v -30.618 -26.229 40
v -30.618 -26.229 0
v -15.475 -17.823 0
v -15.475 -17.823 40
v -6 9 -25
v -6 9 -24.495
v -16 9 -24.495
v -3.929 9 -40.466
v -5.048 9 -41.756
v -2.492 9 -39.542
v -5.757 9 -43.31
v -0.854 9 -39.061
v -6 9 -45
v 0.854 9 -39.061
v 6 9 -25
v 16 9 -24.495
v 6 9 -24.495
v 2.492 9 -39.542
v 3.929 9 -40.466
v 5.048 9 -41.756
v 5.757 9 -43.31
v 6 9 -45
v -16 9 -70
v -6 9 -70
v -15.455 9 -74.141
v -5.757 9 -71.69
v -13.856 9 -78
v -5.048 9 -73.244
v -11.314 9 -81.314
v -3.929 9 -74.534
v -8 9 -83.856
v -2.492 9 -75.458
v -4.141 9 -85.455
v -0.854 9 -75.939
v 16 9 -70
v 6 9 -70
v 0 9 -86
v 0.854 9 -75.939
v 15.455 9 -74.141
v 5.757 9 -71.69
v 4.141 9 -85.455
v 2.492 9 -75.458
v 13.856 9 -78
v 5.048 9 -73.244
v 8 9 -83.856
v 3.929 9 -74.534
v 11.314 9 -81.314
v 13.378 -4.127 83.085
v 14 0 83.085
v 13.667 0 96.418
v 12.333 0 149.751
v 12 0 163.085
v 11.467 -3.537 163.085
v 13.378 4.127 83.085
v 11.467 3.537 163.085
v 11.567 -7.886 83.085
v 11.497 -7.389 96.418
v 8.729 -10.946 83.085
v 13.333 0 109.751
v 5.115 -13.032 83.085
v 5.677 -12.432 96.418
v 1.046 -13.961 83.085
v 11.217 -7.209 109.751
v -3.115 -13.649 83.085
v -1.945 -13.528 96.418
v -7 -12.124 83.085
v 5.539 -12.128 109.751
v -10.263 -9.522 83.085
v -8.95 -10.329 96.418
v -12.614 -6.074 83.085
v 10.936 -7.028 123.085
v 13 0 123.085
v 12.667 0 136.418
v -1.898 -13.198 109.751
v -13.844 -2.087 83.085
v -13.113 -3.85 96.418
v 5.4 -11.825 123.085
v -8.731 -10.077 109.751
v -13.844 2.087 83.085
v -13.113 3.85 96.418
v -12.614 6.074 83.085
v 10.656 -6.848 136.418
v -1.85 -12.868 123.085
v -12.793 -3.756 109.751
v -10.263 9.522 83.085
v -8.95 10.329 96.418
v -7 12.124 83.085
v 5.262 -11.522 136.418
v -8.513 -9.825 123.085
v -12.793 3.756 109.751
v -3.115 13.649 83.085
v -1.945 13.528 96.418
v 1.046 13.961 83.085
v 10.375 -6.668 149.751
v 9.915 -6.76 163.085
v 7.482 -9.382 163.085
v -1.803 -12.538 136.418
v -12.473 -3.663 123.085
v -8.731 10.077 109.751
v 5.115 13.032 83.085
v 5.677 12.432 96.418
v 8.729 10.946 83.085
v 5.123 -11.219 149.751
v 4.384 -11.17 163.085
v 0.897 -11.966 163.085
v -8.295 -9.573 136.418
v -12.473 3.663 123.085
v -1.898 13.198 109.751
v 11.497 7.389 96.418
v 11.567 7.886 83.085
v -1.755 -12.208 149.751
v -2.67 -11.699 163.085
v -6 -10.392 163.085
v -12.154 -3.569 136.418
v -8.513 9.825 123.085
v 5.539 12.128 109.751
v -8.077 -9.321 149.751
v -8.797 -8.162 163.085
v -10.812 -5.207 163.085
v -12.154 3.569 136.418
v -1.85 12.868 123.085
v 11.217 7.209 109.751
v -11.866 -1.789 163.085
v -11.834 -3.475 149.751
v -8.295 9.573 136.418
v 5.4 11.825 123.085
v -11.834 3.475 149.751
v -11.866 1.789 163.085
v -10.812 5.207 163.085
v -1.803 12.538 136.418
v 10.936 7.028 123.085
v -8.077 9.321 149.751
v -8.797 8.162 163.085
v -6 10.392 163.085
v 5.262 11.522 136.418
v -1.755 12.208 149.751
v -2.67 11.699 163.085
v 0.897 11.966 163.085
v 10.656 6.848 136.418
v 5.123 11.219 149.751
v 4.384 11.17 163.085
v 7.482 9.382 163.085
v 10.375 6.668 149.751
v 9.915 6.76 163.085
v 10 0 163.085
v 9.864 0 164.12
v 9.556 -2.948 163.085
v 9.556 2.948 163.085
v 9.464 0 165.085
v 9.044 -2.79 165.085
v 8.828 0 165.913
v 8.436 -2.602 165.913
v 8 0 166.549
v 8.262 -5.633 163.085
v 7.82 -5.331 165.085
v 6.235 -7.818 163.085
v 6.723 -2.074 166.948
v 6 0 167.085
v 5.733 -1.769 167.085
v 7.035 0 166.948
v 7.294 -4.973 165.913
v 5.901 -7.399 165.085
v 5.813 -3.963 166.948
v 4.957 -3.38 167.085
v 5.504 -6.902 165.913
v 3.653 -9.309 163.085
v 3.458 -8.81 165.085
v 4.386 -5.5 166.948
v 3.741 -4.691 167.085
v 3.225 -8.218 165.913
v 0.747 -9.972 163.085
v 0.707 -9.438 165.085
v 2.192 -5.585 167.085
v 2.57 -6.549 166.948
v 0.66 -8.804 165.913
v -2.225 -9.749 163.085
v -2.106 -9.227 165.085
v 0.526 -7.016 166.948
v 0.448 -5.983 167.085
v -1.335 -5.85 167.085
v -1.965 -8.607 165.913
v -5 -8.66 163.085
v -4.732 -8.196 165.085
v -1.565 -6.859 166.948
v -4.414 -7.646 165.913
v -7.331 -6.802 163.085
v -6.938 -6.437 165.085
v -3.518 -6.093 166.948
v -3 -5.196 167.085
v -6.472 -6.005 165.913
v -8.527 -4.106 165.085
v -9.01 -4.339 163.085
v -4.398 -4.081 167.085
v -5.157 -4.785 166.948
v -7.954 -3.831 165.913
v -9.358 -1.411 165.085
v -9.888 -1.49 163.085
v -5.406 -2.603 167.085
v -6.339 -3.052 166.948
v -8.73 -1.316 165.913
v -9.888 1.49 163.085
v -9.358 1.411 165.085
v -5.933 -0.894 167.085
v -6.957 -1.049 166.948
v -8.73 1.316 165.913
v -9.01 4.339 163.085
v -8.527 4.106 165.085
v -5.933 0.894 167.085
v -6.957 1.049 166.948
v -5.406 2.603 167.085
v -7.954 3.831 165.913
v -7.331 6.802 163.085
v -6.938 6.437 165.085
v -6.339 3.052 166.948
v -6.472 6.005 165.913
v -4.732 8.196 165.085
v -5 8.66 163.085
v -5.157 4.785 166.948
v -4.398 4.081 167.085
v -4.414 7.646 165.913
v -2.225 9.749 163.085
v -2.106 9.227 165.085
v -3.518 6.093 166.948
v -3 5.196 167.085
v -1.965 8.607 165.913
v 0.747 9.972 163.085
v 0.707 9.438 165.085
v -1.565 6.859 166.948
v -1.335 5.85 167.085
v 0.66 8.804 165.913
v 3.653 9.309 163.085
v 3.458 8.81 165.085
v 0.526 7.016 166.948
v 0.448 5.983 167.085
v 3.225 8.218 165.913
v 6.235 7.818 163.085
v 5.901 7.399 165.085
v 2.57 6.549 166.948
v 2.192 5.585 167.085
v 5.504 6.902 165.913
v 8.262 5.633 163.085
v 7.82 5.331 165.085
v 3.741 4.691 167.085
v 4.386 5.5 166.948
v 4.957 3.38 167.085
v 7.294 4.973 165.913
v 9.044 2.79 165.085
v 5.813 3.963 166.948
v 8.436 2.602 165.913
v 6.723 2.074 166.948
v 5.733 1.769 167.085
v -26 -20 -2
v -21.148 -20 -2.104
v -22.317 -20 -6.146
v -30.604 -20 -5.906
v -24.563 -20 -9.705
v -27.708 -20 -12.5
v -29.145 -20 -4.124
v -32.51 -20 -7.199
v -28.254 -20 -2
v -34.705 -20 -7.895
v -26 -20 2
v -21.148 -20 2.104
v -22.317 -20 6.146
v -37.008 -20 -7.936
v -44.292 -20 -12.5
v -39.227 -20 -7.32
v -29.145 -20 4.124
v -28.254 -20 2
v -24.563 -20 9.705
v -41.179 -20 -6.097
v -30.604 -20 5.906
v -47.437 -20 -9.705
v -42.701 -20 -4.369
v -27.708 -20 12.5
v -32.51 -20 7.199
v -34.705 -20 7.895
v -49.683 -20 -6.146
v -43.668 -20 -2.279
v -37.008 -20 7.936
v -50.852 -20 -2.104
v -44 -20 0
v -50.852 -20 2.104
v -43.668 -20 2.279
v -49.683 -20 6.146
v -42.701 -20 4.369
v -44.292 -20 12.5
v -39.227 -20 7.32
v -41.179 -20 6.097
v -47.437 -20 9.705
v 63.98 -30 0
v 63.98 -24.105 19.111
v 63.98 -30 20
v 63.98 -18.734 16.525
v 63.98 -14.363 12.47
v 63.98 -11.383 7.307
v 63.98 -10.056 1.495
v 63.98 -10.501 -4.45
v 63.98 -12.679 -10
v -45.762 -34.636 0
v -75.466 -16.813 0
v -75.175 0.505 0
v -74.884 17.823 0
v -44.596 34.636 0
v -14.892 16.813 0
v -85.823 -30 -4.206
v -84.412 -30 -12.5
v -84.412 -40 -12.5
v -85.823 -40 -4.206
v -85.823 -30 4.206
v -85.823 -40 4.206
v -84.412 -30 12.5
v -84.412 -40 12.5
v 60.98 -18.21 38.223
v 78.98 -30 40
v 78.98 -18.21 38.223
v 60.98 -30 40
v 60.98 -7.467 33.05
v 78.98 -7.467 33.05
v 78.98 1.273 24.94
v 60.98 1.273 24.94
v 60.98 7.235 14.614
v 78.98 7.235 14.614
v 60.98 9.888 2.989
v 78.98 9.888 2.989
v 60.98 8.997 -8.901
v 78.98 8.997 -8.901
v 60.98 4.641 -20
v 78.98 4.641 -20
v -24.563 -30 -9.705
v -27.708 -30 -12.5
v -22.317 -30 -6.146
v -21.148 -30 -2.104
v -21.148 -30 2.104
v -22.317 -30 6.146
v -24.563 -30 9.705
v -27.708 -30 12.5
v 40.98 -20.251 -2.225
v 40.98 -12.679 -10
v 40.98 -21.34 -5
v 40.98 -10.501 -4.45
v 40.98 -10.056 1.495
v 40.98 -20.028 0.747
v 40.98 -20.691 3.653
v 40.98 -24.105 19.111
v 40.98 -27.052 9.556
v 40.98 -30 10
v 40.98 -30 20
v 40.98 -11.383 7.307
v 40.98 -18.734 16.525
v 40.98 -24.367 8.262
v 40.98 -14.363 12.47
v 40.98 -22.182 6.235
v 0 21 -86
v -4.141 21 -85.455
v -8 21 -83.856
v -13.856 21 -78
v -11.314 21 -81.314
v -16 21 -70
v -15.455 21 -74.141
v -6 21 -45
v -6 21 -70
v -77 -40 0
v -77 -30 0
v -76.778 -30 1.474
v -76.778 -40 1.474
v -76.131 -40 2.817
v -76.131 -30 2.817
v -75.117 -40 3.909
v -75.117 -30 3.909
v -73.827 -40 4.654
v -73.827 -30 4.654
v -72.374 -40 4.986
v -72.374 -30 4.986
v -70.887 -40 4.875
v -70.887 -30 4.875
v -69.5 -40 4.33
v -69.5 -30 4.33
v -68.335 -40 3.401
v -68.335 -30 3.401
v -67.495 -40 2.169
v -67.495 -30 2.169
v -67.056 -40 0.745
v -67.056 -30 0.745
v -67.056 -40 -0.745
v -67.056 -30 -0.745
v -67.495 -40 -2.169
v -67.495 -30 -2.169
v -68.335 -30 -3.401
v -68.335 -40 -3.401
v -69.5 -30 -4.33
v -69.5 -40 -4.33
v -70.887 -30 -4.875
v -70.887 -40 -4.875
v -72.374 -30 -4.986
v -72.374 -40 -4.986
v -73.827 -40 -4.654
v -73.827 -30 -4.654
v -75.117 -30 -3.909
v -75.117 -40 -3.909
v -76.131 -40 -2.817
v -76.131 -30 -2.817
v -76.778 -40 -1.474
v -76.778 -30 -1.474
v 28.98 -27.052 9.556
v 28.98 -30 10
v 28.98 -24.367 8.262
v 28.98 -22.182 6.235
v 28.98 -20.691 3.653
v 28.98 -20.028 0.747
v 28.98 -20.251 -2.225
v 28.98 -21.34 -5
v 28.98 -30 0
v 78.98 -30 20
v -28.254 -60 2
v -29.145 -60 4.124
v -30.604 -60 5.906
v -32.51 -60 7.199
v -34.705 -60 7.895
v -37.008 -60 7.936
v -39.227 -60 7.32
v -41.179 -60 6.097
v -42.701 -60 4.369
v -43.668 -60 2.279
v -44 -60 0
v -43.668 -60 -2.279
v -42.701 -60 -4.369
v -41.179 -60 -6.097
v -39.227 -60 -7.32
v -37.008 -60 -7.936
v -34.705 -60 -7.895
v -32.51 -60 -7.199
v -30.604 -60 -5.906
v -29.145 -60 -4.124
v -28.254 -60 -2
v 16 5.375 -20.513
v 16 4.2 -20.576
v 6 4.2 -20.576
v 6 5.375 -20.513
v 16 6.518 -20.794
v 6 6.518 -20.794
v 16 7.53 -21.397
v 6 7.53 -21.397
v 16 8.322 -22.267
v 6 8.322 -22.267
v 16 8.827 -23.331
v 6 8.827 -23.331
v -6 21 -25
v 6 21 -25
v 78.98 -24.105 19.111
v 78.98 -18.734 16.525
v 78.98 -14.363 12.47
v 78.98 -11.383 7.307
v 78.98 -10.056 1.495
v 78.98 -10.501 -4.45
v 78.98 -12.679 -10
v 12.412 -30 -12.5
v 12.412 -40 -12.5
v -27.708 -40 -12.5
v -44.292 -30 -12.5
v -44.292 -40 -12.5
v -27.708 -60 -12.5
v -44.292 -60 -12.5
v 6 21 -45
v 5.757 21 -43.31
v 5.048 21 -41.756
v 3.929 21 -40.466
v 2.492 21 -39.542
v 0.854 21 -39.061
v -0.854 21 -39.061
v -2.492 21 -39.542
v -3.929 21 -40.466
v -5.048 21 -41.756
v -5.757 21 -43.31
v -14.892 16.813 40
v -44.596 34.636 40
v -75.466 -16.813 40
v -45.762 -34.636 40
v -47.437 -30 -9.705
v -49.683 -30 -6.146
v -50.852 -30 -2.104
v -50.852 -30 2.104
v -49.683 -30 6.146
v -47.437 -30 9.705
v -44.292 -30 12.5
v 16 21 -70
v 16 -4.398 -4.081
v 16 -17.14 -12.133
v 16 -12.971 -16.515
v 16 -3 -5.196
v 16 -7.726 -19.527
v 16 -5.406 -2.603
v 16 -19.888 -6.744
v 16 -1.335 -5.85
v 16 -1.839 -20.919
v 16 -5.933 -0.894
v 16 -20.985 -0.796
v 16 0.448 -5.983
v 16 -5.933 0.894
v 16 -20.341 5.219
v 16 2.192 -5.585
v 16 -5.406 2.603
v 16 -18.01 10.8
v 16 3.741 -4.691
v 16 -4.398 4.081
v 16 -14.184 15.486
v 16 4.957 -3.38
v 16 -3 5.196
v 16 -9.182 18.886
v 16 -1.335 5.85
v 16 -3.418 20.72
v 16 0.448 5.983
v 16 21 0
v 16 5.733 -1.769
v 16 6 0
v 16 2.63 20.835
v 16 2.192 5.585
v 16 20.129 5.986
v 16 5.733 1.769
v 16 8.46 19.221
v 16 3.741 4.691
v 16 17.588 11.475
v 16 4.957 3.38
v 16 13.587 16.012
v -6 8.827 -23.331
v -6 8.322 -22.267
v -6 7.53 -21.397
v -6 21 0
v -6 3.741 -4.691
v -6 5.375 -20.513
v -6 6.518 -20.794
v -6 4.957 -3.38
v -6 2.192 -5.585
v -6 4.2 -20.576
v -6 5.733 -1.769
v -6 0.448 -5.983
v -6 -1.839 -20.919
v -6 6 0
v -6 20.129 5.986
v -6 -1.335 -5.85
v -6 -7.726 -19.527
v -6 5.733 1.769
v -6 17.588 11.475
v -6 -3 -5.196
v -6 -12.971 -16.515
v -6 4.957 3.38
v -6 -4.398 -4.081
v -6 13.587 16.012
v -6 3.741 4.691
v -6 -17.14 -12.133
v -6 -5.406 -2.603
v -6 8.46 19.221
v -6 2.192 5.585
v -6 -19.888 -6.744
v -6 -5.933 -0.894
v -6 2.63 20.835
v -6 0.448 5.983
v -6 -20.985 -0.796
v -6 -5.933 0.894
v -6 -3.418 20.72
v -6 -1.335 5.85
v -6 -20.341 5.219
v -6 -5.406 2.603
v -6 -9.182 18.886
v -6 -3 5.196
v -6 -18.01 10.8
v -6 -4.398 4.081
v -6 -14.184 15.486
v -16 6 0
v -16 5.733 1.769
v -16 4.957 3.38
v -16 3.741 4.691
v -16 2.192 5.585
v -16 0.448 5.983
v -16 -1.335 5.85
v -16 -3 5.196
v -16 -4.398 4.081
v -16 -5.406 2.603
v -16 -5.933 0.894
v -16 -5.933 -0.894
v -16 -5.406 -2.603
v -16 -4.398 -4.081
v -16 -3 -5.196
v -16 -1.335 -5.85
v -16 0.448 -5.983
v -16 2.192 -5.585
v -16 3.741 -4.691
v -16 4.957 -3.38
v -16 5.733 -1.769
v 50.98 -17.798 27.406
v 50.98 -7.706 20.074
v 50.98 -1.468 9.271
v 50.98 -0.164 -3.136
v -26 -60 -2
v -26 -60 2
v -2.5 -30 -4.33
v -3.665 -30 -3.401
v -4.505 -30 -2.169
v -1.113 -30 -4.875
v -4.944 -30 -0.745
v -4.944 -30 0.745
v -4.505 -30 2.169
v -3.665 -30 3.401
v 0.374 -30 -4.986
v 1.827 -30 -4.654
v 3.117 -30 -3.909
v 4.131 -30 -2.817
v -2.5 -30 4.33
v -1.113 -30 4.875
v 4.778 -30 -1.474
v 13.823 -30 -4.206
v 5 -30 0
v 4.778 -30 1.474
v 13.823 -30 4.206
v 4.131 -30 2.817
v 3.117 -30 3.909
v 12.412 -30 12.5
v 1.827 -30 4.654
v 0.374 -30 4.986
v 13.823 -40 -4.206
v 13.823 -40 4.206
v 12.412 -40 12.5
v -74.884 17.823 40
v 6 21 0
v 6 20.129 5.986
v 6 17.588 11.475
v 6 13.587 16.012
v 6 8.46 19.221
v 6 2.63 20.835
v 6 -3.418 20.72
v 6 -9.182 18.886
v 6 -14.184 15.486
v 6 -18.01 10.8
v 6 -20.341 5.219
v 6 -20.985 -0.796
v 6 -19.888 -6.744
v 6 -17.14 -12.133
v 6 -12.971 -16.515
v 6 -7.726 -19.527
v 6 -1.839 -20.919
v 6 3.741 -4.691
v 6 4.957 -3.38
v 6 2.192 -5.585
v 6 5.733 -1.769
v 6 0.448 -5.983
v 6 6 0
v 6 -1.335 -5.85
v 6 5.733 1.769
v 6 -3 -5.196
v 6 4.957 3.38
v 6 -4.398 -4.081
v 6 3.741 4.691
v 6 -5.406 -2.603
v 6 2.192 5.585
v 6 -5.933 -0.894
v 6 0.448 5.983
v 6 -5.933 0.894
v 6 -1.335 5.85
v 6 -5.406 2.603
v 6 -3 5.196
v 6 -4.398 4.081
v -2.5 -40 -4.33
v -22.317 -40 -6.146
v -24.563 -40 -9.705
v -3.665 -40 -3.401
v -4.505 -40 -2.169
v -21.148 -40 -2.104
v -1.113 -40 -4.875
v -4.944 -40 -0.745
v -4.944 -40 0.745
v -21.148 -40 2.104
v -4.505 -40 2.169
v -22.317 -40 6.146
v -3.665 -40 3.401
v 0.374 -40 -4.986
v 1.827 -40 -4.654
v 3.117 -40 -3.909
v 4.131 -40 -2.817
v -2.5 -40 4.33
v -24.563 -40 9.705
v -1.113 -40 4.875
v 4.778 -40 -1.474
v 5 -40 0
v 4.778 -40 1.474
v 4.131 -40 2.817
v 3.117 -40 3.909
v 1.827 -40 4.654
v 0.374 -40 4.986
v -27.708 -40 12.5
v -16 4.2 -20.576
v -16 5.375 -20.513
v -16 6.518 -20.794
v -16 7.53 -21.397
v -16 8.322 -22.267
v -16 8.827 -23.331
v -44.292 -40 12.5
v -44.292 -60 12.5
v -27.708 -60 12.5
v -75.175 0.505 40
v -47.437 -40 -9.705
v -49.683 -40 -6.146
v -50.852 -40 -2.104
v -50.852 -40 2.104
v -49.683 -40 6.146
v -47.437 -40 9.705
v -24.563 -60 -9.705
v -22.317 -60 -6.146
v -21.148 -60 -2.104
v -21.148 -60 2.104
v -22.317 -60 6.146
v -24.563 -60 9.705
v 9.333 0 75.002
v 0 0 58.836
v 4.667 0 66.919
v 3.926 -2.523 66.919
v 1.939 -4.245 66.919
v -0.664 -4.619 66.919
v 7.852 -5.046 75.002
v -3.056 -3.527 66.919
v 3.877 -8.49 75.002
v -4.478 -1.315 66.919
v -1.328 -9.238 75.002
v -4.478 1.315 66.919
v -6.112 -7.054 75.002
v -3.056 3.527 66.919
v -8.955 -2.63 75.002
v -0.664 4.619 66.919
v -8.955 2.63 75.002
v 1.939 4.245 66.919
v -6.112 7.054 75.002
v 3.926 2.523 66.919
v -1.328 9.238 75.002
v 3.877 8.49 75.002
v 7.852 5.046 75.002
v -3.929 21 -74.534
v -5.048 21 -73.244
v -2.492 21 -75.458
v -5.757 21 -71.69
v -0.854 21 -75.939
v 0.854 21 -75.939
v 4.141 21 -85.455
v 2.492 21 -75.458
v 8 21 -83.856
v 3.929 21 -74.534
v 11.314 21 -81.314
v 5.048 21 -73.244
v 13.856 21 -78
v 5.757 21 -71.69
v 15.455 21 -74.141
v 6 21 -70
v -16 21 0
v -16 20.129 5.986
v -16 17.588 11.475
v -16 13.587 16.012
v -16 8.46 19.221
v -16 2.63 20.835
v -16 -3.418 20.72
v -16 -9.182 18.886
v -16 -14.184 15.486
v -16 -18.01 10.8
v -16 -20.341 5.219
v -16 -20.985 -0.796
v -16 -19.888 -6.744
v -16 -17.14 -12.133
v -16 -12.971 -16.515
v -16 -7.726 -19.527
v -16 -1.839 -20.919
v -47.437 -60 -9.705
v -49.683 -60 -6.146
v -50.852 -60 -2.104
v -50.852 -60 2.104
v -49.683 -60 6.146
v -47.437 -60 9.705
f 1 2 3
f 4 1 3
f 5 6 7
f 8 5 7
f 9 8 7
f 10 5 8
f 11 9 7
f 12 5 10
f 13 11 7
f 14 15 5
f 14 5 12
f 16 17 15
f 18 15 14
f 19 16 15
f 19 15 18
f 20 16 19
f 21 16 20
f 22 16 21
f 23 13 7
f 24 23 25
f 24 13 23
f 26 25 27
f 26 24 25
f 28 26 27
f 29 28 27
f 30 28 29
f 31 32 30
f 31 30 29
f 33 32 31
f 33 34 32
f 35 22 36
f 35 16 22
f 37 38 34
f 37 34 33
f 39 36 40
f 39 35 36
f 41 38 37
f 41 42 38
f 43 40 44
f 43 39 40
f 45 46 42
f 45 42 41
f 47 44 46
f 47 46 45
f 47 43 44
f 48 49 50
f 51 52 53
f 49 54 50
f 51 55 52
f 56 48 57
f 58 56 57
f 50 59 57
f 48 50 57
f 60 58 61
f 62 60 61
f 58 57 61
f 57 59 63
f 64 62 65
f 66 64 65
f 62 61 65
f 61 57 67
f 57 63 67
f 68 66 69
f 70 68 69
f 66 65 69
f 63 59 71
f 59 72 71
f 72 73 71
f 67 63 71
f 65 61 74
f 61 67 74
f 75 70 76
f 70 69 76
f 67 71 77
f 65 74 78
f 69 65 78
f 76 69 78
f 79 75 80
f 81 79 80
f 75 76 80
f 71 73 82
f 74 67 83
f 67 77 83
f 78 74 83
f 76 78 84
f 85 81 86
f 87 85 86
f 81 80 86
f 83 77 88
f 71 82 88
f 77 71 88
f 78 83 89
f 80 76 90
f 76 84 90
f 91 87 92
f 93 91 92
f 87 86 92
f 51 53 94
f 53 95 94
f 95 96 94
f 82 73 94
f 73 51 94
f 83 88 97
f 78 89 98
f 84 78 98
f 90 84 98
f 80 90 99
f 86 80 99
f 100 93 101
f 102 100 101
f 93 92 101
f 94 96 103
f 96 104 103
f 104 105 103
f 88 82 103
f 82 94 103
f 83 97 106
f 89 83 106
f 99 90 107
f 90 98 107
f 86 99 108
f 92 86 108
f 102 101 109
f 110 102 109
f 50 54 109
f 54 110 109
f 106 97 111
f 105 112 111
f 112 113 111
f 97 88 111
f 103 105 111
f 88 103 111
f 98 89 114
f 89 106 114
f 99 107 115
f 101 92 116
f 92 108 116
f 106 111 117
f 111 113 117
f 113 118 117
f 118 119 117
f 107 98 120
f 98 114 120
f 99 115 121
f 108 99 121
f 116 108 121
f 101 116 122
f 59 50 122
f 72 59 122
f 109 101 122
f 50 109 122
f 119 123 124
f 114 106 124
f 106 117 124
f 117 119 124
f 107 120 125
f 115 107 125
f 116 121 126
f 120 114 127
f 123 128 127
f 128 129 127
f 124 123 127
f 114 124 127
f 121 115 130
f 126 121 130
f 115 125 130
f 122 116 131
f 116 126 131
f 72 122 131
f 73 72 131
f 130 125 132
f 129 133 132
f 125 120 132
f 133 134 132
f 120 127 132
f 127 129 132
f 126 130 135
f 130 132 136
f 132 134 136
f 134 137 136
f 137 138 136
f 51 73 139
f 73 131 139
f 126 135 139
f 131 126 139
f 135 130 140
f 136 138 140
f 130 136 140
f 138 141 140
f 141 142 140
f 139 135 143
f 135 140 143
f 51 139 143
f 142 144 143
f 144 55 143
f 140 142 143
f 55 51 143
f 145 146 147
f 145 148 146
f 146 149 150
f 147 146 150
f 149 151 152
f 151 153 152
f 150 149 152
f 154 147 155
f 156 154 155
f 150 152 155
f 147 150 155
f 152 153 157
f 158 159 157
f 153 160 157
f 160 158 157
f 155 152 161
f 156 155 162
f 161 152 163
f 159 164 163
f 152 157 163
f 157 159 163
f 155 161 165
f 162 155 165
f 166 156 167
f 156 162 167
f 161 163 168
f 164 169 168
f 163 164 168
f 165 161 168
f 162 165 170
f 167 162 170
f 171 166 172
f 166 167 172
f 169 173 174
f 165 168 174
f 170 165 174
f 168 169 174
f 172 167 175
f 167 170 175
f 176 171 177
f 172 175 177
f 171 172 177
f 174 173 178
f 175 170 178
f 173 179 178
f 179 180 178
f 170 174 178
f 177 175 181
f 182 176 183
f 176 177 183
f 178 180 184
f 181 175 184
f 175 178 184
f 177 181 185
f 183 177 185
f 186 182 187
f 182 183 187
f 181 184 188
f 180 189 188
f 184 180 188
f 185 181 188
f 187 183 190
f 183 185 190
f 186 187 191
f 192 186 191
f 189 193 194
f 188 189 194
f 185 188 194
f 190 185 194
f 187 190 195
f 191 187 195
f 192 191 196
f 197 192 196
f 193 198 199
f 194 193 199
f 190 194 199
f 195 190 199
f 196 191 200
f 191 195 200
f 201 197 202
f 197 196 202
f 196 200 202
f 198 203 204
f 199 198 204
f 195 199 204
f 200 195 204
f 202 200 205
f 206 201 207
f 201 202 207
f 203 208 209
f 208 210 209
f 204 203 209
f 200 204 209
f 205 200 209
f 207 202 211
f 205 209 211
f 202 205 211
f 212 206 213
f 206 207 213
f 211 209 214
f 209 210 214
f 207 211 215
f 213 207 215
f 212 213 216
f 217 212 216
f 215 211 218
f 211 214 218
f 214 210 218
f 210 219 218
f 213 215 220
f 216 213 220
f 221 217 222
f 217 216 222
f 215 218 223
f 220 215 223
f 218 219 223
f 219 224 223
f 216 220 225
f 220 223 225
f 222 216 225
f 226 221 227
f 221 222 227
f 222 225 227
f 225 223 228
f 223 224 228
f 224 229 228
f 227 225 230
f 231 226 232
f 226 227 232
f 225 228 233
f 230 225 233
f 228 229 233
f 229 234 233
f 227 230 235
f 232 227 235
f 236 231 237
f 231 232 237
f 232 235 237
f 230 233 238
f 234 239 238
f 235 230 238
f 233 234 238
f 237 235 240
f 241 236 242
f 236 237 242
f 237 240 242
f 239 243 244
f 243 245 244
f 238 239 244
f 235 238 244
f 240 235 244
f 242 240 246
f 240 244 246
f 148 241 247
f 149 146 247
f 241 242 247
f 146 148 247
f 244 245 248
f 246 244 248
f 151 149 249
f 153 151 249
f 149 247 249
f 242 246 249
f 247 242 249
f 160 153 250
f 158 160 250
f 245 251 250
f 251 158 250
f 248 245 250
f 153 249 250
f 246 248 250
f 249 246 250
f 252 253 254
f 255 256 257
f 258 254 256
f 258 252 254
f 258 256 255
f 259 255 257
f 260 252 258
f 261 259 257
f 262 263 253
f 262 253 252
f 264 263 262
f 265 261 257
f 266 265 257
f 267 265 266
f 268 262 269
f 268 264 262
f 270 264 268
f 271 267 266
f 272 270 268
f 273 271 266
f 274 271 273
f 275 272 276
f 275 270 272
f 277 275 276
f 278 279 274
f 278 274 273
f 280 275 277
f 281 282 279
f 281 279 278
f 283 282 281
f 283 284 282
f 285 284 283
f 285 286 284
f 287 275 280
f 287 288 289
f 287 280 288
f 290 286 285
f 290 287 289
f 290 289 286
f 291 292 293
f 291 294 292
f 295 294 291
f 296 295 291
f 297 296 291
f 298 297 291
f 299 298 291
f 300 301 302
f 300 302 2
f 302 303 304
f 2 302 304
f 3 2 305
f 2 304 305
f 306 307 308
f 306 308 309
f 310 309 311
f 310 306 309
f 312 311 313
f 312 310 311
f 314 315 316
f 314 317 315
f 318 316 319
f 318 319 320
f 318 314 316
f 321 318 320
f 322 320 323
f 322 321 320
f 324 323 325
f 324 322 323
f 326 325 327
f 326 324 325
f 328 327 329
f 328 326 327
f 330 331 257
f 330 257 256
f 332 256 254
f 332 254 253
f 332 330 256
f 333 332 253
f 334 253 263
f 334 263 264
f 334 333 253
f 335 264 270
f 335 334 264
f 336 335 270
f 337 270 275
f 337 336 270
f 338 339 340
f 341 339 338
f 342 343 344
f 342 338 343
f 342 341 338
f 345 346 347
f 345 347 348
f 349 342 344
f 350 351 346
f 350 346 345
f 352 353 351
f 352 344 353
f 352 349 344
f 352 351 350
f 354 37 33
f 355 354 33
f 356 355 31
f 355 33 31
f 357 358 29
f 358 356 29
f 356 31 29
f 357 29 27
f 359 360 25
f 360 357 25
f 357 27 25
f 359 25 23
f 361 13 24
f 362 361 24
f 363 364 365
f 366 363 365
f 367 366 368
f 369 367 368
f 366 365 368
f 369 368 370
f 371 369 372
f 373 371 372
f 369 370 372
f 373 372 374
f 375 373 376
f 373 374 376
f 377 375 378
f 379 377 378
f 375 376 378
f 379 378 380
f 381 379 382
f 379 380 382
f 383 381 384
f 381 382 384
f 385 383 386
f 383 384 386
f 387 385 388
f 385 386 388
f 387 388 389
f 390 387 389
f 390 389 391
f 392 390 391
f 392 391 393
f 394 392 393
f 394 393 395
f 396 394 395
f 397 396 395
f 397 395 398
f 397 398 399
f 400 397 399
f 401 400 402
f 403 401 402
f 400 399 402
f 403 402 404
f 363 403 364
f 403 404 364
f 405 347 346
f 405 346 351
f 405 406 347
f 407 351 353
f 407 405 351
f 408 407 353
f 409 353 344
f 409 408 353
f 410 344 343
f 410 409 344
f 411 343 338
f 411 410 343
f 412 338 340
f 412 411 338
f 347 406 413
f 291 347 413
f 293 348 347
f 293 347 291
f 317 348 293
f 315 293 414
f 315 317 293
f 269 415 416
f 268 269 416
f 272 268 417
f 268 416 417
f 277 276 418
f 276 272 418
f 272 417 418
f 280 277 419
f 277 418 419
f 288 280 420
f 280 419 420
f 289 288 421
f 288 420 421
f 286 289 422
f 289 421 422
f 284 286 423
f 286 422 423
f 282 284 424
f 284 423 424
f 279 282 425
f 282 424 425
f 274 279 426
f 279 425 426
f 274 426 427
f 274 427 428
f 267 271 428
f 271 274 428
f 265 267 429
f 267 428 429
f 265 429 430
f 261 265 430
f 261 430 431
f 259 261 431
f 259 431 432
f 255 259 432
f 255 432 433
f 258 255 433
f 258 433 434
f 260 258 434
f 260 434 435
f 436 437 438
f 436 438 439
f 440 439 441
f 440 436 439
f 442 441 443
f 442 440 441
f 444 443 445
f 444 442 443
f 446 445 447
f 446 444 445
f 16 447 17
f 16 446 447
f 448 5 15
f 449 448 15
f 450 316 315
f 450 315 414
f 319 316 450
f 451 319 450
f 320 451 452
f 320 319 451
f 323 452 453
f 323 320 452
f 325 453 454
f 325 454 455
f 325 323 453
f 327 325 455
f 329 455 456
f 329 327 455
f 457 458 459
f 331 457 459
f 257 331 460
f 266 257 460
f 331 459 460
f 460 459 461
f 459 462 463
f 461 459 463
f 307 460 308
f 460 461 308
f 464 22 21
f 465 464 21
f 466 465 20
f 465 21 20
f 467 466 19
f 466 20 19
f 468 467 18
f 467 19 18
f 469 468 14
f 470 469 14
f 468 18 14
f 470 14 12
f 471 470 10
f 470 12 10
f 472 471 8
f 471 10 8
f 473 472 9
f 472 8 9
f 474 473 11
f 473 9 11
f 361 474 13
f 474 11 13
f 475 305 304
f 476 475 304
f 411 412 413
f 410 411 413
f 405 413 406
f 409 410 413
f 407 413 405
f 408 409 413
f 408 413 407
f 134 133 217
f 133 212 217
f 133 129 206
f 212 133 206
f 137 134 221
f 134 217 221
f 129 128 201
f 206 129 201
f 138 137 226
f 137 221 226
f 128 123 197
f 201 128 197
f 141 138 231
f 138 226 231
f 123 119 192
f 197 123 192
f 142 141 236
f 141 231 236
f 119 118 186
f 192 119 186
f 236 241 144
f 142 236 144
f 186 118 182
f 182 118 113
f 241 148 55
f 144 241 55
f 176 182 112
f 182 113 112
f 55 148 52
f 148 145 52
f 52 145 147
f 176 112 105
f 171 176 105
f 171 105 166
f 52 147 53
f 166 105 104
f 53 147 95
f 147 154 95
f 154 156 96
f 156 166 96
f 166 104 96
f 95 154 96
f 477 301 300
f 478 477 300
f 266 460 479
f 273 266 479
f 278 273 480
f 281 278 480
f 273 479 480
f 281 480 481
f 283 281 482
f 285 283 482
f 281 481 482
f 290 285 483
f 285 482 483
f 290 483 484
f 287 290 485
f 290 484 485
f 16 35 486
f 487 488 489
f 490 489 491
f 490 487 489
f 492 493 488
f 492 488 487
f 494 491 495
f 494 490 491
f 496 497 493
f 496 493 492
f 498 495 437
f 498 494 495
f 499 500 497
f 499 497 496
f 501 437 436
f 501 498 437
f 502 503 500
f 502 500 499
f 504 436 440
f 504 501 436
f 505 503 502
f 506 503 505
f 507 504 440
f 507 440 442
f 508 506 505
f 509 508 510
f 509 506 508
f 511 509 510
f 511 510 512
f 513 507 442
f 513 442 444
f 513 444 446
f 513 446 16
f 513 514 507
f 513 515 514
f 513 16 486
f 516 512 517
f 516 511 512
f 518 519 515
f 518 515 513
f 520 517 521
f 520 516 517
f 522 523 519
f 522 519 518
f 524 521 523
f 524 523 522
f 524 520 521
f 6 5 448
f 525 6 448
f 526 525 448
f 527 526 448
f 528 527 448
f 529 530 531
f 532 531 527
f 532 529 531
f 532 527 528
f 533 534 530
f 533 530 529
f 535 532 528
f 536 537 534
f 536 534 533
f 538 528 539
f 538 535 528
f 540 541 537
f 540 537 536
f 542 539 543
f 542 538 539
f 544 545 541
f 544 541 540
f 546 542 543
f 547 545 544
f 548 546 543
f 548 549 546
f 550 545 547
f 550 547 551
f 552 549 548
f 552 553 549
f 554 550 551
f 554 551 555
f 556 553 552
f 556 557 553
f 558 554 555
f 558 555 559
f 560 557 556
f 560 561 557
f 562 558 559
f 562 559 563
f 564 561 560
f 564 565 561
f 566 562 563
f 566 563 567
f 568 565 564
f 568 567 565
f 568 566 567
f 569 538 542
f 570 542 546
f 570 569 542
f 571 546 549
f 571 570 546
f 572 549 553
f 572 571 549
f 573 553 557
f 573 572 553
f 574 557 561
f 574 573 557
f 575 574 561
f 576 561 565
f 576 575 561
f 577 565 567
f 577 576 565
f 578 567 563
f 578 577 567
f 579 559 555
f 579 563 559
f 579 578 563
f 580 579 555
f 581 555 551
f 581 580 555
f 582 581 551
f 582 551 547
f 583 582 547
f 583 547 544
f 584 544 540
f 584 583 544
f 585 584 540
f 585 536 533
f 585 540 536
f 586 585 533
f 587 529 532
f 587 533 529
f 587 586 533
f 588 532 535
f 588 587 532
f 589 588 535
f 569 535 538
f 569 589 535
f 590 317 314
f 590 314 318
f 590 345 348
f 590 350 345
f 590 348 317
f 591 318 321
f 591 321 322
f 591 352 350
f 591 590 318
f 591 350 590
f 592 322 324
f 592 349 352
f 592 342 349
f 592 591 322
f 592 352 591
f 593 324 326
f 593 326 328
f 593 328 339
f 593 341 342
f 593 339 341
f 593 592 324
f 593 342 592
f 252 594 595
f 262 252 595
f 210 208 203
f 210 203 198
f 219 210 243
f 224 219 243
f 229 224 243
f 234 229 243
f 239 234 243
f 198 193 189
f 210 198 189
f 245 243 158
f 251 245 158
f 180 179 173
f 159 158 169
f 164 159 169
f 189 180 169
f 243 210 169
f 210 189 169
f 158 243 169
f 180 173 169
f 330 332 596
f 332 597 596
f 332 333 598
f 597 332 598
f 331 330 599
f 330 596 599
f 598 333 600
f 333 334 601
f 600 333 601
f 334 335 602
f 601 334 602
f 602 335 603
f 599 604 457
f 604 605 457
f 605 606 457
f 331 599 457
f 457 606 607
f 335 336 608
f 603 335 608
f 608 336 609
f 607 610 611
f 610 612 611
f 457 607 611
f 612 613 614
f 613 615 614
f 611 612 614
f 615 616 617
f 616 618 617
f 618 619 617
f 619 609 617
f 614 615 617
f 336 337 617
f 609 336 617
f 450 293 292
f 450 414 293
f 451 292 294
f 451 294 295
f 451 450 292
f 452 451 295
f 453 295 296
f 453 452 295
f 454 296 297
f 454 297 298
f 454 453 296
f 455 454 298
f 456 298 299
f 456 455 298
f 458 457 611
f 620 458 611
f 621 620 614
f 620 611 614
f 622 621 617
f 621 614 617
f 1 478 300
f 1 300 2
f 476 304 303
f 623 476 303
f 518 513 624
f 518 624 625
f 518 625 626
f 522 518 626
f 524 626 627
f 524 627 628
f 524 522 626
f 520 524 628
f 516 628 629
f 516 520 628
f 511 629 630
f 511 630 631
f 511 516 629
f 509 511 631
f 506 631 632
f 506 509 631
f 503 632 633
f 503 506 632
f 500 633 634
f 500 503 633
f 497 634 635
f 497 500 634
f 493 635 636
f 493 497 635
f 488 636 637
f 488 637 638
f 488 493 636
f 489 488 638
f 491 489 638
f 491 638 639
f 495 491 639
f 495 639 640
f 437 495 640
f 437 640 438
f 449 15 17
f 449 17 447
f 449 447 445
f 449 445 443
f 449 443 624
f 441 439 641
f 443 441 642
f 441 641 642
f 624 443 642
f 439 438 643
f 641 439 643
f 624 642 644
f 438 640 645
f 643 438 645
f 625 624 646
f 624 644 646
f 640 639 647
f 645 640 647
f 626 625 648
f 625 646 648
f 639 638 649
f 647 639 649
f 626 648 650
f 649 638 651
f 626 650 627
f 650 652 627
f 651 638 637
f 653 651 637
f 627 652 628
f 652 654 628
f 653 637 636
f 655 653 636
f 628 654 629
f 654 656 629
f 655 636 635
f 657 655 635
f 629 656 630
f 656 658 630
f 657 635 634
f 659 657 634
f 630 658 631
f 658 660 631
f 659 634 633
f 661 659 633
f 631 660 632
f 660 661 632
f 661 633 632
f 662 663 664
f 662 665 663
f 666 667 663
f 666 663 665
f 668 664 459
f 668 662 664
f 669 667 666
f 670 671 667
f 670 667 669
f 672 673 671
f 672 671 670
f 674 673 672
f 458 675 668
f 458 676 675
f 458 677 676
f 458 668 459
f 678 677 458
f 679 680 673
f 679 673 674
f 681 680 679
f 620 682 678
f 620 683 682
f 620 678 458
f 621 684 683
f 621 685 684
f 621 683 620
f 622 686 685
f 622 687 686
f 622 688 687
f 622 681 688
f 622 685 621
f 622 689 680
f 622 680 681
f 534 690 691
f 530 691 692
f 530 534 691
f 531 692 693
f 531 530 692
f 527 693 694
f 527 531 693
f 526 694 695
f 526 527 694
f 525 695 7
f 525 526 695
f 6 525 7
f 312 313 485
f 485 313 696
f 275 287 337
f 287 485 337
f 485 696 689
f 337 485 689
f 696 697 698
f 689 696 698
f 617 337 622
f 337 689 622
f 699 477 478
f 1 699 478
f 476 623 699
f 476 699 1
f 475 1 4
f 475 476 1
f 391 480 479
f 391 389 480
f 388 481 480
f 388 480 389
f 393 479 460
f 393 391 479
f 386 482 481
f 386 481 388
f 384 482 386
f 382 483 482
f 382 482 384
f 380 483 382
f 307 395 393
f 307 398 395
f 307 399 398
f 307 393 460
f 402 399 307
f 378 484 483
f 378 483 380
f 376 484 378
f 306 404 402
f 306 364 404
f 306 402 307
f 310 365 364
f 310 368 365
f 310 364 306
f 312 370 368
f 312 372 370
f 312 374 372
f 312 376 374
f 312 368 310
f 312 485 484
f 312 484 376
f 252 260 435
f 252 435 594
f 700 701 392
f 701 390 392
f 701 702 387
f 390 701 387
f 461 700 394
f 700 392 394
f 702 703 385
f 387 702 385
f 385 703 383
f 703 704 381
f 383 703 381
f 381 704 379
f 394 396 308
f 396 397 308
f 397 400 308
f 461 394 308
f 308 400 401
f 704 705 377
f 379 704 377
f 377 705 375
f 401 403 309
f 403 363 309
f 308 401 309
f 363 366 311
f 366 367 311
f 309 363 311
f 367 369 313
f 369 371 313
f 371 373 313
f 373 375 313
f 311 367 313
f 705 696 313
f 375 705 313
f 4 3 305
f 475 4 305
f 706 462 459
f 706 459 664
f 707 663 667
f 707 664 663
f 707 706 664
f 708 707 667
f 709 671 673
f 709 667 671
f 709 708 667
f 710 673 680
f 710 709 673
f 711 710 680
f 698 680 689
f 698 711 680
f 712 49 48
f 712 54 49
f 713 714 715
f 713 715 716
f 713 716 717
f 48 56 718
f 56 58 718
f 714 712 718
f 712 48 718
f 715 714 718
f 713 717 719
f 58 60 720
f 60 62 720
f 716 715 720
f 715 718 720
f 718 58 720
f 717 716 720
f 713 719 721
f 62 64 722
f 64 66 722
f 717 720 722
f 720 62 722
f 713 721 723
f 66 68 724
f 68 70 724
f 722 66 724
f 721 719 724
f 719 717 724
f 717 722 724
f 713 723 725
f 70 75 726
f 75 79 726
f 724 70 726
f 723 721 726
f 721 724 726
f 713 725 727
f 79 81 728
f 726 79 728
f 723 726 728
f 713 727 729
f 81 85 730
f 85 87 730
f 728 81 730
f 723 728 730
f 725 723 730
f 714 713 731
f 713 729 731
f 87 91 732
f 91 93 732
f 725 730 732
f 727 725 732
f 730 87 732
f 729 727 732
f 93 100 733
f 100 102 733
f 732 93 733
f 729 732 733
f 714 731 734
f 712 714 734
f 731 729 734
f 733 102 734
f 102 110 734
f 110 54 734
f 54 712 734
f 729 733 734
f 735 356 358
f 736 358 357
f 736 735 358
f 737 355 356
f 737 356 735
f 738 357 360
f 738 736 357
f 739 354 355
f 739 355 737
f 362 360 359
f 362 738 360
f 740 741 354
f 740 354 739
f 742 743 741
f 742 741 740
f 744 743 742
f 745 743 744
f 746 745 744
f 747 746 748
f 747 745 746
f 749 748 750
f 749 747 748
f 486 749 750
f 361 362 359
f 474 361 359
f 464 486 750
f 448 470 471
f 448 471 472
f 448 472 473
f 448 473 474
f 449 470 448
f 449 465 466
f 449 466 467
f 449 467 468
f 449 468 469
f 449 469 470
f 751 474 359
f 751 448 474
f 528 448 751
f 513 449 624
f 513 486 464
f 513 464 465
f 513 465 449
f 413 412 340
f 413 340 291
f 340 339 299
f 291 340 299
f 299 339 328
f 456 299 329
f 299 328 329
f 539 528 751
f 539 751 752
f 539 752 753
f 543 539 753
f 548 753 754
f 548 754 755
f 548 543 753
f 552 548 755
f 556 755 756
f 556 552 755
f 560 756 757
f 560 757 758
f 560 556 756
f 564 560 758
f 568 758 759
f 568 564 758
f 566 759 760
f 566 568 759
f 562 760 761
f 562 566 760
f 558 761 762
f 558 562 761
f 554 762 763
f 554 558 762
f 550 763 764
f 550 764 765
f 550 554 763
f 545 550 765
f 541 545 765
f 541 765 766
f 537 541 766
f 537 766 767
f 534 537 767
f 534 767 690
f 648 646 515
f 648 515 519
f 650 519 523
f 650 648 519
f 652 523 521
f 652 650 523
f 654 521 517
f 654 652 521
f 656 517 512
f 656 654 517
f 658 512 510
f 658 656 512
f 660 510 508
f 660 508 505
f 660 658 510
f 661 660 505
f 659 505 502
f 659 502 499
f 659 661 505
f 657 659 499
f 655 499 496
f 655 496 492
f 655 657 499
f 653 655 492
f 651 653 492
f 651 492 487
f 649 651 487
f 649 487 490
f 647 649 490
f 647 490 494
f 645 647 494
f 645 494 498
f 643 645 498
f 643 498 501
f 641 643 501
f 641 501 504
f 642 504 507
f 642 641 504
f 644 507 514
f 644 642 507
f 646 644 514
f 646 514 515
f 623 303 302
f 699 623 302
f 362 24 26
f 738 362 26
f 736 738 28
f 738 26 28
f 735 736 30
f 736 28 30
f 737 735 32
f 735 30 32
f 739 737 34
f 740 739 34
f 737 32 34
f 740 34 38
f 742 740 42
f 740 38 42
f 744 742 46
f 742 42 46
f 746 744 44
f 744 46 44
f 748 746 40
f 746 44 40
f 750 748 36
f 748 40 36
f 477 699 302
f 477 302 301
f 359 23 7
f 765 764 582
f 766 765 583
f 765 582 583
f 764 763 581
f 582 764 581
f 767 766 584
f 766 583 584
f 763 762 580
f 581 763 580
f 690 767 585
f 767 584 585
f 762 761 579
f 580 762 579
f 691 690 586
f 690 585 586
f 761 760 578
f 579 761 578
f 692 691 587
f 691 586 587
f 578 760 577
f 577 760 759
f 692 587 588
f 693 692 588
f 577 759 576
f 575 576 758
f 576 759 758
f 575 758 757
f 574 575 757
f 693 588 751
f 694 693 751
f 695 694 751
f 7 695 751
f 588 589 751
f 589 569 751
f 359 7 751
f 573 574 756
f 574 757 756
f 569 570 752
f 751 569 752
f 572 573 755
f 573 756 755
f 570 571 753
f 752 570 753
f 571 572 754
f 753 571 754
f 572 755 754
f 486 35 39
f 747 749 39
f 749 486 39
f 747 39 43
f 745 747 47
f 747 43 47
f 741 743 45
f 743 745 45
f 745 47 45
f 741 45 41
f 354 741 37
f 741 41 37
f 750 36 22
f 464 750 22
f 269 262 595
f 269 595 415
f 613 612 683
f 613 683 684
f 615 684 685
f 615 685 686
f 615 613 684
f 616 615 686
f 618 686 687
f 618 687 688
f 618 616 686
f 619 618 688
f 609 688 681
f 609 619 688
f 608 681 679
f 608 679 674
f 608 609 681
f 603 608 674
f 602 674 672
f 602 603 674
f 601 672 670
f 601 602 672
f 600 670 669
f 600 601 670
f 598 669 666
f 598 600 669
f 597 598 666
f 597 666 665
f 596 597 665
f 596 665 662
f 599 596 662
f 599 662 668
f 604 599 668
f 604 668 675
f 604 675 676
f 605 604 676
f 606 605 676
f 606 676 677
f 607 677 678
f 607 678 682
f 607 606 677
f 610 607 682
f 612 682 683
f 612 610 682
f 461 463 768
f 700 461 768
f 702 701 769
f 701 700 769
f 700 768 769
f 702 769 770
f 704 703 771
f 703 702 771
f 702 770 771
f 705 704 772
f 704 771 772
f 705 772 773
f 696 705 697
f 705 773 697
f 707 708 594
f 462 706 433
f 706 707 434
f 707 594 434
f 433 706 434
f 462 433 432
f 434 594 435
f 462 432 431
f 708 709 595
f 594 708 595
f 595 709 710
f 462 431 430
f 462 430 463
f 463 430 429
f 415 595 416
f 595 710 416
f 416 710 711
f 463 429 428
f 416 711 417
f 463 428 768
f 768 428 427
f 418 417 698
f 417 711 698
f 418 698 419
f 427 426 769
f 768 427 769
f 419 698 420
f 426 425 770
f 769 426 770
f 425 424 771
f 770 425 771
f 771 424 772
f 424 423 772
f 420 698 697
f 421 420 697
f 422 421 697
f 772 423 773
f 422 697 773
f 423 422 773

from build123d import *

# Parameters (mm, degrees)
F0_R          = 6
F1_DEPTH      = 16
F3_W          = 12
F3_H          = 46
F4_DEPTH      = 51.001
F6_DEPTH      = 30
F6_DEPTH_BACK = 10
F5_R          = 5
F7_DEPTH      = 10
F11_DEPTH     = 81.001
F15_ANGLE     = 120
F17_DEPTH     = 40


with BuildPart() as f1:
    # F0 (on Right) → F1 (new body, symmetric)
    with BuildSketch(Plane.YZ):
        with BuildLine():
            Line((21, -86), (21, 0))
            ThreePointArc((21, 0), (-16.2665300541, 13.2815661727), (4.2, -20.5757138394))
            ThreePointArc((4.2, -20.5757138394), (7.5298221281, -21.3965107509), (9, -24.4948974278))
            Line((9, -24.4948974278), (9, -86))
            Line((9, -86), (21, -86))
        make_face()
        Circle(F0_R, mode=Mode.SUBTRACT)
    extrude(amount=F1_DEPTH, both=True)

    # F3 (on offset) → F4 (cut, through all)
    with BuildSketch(Plane.XZ.offset(30)):
        with Locations((0, -2)):
            Rectangle(F3_W, F3_H)
        with BuildLine():
            ThreePointArc((6, -45), (0, -39), (-6, -45))
            Line((-6, -45), (-6, -70))
            ThreePointArc((-6, -70), (0, -76), (6, -70))
            Line((6, -70), (6, -45))
        make_face()
        with BuildLine():
            ThreePointArc((2.313e-07, -86), (-11.3137084172, -81.3137085808), (-16, -70))
            Line((-16, -70), (-16, -86))
            Line((-16, -86), (2.313e-07, -86))
        make_face()
        with BuildLine():
            ThreePointArc((16, -70), (11.3137085808, -81.3137084172), (2.313e-07, -86))
            Line((2.313e-07, -86), (16, -86))
            Line((16, -86), (16, -70))
        make_face()
    extrude(amount=-F4_DEPTH, mode=Mode.SUBTRACT)


with BuildPart() as f6:
    # F5 (on offset) → F6 (new body, two sides)
    with BuildSketch(Plane.XZ.offset(30)) as f6_sk:
        with BuildLine():
            ThreePointArc((-36, 8), (-28, 0), (-36, -8))
            Line((-36, -8), (-36, -12.5))
            Line((-36, -12.5), (-27.7084380241, -12.5))
            ThreePointArc((-27.7084380241, -12.5), (-21, 0), (-27.7084380241, 12.5))
            Line((-27.7084380241, 12.5), (-36, 12.5))
            Line((-36, 12.5), (-36, 8))
        make_face()
    extrude(amount=F6_DEPTH)
    extrude(f6_sk.sketch, amount=-F6_DEPTH_BACK)

    # F5 (on offset) → F7 (join)
    with BuildSketch(Plane.XZ.offset(30)):
        with BuildLine():
            ThreePointArc((-27.7084380241, 12.5), (-21, 0), (-27.7084380241, -12.5))
            Line((-27.7084380241, -12.5), (12.4122918276, -12.5))
            ThreePointArc((12.4122918276, -12.5), (14, 0), (12.4122918276, 12.5))
            Line((12.4122918276, 12.5), (-27.7084380241, 12.5))
        make_face()
        Circle(F5_R, mode=Mode.SUBTRACT)
    extrude(amount=F7_DEPTH)

    # F9: F6 across plane


with BuildPart() as f6_1:
    add(f6.part)
    add(f6.part.mirror(Plane(origin=(-36, -40, 10.25), x_dir=(0, -1, 0), z_dir=(-1, 0, 0))))

    # F10 (on face) → F11 (cut, through all)
    with BuildSketch(Plane.XZ.offset(60)):
        with BuildLine():
            Line((-28.2540333076, -2), (-26, -2))
            Line((-26, -2), (-26, 2))
            Line((-26, 2), (-28.2540333076, 2))
            ThreePointArc((-28.2540333076, 2), (-28.0637624299, 1.0080343399), (-28, 0))
            ThreePointArc((-28, 0), (-28.0637624299, -1.0080343399), (-28.2540333076, -2))
        make_face()
    extrude(amount=-F11_DEPTH, mode=Mode.SUBTRACT)


with BuildPart() as f13:
    # F12 (on Front) → F13 (revolve)
    with BuildSketch(Plane.XZ):
        Polygon((0, 83.0847536068), (0, 58.8360423009), (14, 83.0847536068), align=None)
        with BuildLine():
            Line((0, 83.0847536068), (14, 83.0847536068))
            Line((14, 83.0847536068), (12, 163.0847536068))
            Line((12, 163.0847536068), (10, 163.0847536068))
            ThreePointArc((10, 163.0847536068), (8.8284271247, 165.9131807316), (6, 167.0847536068))
            Line((6, 167.0847536068), (0, 167.0847536068))
            Line((0, 167.0847536068), (0, 83.0847536068))
        make_face()
    revolve(axis=Axis((0, 0, 112.9603979538), (0, 0, -1)))


with BuildPart() as f15:
    # F14 (on offset) → F15 (revolve)
    with BuildSketch(Plane.XZ.offset(30)):
        Polygon((28.9800996632, 0), (63.9800996632, 0), (63.9800996632, 20), (78.9800996632, 20), (78.9800996632, 40), (60.9800996632, 40), (40.9800996632, 20), (40.9800996632, 10), (28.9800996632, 10), align=None)
    revolve(axis=Axis((46.4800996632, -30, 0), (-1, 0, 0)), revolution_arc=F15_ANGLE)


with BuildPart() as f17:
    # F16 (on Top) → F17 (new body)
    with BuildSketch(Plane.XY):
        with BuildLine():
            Line((-29.7442835163, 25.7247878067), (-44.5964966021, 34.6361156582))
            Line((-44.5964966021, 34.6361156582), (-59.7400388381, 26.2293860866))
            ThreePointArc((-59.7400388381, 26.2293860866), (-44.6745578282, 29.9957560425), (-29.7442835163, 25.7247878067))
        make_face()
        with BuildLine():
            Line((-14.8920703128, 16.8134598846), (-29.7442835163, 25.7247878067))
            ThreePointArc((-29.7442835163, 25.7247878067), (-19.0731589346, 14.7809644793), (-15.1791561203, 0))
            ThreePointArc((-15.1791561203, 0), (-15.1802171275, -0.2523079579), (-15.183400074, -0.5045980691))
            Line((-15.183400074, -0.5045980691), (-14.8920703128, 16.8134598846))
        make_face()
        with BuildLine():
            ThreePointArc((-15.1791561203, 0), (-19.0731589346, 14.7809644793), (-29.7442835163, 25.7247878067))
            ThreePointArc((-29.7442835163, 25.7247878067), (-44.6745578282, 29.9957560425), (-59.7400388381, 26.2293860866))
            ThreePointArc((-59.7400388381, 26.2293860866), (-70.9039437918, 15.4348728293), (-75.174912175, 0.504597569))
            ThreePointArc((-75.174912175, 0.504597569), (-71.4085418639, -14.5608833355), (-60.6140292033, -25.7247875193))
            ThreePointArc((-60.6140292033, -25.7247875193), (-45.683754357, -29.9957560435), (-30.6182728172, -26.2293857617))
            ThreePointArc((-30.6182728172, -26.2293857617), (-19.4543684053, -15.4348727567), (-15.183400074, -0.5045980691))
            ThreePointArc((-15.183400074, -0.5045980691), (-15.1802171275, -0.2523079579), (-15.1791561203, 0))
        make_face()
        with BuildLine():
            ThreePointArc((-75.174912175, 0.504597569), (-70.9039437918, 15.4348728293), (-59.7400388381, 26.2293860866))
            Line((-59.7400388381, 26.2293860866), (-74.8835824096, 17.8226557736))
            Line((-74.8835824096, 17.8226557736), (-75.174912175, 0.504597569))
        make_face()
        with BuildLine():
            ThreePointArc((-60.6140292033, -25.7247875193), (-71.4085418639, -14.5608833355), (-75.174912175, 0.504597569))
            Line((-75.174912175, 0.504597569), (-75.4662419278, -16.8134598846))
            Line((-75.4662419278, -16.8134598846), (-60.6140292033, -25.7247875193))
        make_face()
        with BuildLine():
            Line((-15.474729831, -17.8226557736), (-15.183400074, -0.5045980691))
            ThreePointArc((-15.183400074, -0.5045980691), (-19.4543684053, -15.4348727567), (-30.6182728172, -26.2293857617))
            Line((-30.6182728172, -26.2293857617), (-15.474729831, -17.8226557736))
        make_face()
        with BuildLine():
            ThreePointArc((-30.6182728172, -26.2293857617), (-45.683754357, -29.9957560435), (-60.6140292033, -25.7247875193))
            Line((-60.6140292033, -25.7247875193), (-45.7618156385, -34.6361156582))
            Line((-45.7618156385, -34.6361156582), (-30.6182728172, -26.2293857617))
        make_face()
    extrude(amount=F17_DEPTH)


solid = Compound([f1.part, f6_1.part, f13.part, f15.part, f17.part])
